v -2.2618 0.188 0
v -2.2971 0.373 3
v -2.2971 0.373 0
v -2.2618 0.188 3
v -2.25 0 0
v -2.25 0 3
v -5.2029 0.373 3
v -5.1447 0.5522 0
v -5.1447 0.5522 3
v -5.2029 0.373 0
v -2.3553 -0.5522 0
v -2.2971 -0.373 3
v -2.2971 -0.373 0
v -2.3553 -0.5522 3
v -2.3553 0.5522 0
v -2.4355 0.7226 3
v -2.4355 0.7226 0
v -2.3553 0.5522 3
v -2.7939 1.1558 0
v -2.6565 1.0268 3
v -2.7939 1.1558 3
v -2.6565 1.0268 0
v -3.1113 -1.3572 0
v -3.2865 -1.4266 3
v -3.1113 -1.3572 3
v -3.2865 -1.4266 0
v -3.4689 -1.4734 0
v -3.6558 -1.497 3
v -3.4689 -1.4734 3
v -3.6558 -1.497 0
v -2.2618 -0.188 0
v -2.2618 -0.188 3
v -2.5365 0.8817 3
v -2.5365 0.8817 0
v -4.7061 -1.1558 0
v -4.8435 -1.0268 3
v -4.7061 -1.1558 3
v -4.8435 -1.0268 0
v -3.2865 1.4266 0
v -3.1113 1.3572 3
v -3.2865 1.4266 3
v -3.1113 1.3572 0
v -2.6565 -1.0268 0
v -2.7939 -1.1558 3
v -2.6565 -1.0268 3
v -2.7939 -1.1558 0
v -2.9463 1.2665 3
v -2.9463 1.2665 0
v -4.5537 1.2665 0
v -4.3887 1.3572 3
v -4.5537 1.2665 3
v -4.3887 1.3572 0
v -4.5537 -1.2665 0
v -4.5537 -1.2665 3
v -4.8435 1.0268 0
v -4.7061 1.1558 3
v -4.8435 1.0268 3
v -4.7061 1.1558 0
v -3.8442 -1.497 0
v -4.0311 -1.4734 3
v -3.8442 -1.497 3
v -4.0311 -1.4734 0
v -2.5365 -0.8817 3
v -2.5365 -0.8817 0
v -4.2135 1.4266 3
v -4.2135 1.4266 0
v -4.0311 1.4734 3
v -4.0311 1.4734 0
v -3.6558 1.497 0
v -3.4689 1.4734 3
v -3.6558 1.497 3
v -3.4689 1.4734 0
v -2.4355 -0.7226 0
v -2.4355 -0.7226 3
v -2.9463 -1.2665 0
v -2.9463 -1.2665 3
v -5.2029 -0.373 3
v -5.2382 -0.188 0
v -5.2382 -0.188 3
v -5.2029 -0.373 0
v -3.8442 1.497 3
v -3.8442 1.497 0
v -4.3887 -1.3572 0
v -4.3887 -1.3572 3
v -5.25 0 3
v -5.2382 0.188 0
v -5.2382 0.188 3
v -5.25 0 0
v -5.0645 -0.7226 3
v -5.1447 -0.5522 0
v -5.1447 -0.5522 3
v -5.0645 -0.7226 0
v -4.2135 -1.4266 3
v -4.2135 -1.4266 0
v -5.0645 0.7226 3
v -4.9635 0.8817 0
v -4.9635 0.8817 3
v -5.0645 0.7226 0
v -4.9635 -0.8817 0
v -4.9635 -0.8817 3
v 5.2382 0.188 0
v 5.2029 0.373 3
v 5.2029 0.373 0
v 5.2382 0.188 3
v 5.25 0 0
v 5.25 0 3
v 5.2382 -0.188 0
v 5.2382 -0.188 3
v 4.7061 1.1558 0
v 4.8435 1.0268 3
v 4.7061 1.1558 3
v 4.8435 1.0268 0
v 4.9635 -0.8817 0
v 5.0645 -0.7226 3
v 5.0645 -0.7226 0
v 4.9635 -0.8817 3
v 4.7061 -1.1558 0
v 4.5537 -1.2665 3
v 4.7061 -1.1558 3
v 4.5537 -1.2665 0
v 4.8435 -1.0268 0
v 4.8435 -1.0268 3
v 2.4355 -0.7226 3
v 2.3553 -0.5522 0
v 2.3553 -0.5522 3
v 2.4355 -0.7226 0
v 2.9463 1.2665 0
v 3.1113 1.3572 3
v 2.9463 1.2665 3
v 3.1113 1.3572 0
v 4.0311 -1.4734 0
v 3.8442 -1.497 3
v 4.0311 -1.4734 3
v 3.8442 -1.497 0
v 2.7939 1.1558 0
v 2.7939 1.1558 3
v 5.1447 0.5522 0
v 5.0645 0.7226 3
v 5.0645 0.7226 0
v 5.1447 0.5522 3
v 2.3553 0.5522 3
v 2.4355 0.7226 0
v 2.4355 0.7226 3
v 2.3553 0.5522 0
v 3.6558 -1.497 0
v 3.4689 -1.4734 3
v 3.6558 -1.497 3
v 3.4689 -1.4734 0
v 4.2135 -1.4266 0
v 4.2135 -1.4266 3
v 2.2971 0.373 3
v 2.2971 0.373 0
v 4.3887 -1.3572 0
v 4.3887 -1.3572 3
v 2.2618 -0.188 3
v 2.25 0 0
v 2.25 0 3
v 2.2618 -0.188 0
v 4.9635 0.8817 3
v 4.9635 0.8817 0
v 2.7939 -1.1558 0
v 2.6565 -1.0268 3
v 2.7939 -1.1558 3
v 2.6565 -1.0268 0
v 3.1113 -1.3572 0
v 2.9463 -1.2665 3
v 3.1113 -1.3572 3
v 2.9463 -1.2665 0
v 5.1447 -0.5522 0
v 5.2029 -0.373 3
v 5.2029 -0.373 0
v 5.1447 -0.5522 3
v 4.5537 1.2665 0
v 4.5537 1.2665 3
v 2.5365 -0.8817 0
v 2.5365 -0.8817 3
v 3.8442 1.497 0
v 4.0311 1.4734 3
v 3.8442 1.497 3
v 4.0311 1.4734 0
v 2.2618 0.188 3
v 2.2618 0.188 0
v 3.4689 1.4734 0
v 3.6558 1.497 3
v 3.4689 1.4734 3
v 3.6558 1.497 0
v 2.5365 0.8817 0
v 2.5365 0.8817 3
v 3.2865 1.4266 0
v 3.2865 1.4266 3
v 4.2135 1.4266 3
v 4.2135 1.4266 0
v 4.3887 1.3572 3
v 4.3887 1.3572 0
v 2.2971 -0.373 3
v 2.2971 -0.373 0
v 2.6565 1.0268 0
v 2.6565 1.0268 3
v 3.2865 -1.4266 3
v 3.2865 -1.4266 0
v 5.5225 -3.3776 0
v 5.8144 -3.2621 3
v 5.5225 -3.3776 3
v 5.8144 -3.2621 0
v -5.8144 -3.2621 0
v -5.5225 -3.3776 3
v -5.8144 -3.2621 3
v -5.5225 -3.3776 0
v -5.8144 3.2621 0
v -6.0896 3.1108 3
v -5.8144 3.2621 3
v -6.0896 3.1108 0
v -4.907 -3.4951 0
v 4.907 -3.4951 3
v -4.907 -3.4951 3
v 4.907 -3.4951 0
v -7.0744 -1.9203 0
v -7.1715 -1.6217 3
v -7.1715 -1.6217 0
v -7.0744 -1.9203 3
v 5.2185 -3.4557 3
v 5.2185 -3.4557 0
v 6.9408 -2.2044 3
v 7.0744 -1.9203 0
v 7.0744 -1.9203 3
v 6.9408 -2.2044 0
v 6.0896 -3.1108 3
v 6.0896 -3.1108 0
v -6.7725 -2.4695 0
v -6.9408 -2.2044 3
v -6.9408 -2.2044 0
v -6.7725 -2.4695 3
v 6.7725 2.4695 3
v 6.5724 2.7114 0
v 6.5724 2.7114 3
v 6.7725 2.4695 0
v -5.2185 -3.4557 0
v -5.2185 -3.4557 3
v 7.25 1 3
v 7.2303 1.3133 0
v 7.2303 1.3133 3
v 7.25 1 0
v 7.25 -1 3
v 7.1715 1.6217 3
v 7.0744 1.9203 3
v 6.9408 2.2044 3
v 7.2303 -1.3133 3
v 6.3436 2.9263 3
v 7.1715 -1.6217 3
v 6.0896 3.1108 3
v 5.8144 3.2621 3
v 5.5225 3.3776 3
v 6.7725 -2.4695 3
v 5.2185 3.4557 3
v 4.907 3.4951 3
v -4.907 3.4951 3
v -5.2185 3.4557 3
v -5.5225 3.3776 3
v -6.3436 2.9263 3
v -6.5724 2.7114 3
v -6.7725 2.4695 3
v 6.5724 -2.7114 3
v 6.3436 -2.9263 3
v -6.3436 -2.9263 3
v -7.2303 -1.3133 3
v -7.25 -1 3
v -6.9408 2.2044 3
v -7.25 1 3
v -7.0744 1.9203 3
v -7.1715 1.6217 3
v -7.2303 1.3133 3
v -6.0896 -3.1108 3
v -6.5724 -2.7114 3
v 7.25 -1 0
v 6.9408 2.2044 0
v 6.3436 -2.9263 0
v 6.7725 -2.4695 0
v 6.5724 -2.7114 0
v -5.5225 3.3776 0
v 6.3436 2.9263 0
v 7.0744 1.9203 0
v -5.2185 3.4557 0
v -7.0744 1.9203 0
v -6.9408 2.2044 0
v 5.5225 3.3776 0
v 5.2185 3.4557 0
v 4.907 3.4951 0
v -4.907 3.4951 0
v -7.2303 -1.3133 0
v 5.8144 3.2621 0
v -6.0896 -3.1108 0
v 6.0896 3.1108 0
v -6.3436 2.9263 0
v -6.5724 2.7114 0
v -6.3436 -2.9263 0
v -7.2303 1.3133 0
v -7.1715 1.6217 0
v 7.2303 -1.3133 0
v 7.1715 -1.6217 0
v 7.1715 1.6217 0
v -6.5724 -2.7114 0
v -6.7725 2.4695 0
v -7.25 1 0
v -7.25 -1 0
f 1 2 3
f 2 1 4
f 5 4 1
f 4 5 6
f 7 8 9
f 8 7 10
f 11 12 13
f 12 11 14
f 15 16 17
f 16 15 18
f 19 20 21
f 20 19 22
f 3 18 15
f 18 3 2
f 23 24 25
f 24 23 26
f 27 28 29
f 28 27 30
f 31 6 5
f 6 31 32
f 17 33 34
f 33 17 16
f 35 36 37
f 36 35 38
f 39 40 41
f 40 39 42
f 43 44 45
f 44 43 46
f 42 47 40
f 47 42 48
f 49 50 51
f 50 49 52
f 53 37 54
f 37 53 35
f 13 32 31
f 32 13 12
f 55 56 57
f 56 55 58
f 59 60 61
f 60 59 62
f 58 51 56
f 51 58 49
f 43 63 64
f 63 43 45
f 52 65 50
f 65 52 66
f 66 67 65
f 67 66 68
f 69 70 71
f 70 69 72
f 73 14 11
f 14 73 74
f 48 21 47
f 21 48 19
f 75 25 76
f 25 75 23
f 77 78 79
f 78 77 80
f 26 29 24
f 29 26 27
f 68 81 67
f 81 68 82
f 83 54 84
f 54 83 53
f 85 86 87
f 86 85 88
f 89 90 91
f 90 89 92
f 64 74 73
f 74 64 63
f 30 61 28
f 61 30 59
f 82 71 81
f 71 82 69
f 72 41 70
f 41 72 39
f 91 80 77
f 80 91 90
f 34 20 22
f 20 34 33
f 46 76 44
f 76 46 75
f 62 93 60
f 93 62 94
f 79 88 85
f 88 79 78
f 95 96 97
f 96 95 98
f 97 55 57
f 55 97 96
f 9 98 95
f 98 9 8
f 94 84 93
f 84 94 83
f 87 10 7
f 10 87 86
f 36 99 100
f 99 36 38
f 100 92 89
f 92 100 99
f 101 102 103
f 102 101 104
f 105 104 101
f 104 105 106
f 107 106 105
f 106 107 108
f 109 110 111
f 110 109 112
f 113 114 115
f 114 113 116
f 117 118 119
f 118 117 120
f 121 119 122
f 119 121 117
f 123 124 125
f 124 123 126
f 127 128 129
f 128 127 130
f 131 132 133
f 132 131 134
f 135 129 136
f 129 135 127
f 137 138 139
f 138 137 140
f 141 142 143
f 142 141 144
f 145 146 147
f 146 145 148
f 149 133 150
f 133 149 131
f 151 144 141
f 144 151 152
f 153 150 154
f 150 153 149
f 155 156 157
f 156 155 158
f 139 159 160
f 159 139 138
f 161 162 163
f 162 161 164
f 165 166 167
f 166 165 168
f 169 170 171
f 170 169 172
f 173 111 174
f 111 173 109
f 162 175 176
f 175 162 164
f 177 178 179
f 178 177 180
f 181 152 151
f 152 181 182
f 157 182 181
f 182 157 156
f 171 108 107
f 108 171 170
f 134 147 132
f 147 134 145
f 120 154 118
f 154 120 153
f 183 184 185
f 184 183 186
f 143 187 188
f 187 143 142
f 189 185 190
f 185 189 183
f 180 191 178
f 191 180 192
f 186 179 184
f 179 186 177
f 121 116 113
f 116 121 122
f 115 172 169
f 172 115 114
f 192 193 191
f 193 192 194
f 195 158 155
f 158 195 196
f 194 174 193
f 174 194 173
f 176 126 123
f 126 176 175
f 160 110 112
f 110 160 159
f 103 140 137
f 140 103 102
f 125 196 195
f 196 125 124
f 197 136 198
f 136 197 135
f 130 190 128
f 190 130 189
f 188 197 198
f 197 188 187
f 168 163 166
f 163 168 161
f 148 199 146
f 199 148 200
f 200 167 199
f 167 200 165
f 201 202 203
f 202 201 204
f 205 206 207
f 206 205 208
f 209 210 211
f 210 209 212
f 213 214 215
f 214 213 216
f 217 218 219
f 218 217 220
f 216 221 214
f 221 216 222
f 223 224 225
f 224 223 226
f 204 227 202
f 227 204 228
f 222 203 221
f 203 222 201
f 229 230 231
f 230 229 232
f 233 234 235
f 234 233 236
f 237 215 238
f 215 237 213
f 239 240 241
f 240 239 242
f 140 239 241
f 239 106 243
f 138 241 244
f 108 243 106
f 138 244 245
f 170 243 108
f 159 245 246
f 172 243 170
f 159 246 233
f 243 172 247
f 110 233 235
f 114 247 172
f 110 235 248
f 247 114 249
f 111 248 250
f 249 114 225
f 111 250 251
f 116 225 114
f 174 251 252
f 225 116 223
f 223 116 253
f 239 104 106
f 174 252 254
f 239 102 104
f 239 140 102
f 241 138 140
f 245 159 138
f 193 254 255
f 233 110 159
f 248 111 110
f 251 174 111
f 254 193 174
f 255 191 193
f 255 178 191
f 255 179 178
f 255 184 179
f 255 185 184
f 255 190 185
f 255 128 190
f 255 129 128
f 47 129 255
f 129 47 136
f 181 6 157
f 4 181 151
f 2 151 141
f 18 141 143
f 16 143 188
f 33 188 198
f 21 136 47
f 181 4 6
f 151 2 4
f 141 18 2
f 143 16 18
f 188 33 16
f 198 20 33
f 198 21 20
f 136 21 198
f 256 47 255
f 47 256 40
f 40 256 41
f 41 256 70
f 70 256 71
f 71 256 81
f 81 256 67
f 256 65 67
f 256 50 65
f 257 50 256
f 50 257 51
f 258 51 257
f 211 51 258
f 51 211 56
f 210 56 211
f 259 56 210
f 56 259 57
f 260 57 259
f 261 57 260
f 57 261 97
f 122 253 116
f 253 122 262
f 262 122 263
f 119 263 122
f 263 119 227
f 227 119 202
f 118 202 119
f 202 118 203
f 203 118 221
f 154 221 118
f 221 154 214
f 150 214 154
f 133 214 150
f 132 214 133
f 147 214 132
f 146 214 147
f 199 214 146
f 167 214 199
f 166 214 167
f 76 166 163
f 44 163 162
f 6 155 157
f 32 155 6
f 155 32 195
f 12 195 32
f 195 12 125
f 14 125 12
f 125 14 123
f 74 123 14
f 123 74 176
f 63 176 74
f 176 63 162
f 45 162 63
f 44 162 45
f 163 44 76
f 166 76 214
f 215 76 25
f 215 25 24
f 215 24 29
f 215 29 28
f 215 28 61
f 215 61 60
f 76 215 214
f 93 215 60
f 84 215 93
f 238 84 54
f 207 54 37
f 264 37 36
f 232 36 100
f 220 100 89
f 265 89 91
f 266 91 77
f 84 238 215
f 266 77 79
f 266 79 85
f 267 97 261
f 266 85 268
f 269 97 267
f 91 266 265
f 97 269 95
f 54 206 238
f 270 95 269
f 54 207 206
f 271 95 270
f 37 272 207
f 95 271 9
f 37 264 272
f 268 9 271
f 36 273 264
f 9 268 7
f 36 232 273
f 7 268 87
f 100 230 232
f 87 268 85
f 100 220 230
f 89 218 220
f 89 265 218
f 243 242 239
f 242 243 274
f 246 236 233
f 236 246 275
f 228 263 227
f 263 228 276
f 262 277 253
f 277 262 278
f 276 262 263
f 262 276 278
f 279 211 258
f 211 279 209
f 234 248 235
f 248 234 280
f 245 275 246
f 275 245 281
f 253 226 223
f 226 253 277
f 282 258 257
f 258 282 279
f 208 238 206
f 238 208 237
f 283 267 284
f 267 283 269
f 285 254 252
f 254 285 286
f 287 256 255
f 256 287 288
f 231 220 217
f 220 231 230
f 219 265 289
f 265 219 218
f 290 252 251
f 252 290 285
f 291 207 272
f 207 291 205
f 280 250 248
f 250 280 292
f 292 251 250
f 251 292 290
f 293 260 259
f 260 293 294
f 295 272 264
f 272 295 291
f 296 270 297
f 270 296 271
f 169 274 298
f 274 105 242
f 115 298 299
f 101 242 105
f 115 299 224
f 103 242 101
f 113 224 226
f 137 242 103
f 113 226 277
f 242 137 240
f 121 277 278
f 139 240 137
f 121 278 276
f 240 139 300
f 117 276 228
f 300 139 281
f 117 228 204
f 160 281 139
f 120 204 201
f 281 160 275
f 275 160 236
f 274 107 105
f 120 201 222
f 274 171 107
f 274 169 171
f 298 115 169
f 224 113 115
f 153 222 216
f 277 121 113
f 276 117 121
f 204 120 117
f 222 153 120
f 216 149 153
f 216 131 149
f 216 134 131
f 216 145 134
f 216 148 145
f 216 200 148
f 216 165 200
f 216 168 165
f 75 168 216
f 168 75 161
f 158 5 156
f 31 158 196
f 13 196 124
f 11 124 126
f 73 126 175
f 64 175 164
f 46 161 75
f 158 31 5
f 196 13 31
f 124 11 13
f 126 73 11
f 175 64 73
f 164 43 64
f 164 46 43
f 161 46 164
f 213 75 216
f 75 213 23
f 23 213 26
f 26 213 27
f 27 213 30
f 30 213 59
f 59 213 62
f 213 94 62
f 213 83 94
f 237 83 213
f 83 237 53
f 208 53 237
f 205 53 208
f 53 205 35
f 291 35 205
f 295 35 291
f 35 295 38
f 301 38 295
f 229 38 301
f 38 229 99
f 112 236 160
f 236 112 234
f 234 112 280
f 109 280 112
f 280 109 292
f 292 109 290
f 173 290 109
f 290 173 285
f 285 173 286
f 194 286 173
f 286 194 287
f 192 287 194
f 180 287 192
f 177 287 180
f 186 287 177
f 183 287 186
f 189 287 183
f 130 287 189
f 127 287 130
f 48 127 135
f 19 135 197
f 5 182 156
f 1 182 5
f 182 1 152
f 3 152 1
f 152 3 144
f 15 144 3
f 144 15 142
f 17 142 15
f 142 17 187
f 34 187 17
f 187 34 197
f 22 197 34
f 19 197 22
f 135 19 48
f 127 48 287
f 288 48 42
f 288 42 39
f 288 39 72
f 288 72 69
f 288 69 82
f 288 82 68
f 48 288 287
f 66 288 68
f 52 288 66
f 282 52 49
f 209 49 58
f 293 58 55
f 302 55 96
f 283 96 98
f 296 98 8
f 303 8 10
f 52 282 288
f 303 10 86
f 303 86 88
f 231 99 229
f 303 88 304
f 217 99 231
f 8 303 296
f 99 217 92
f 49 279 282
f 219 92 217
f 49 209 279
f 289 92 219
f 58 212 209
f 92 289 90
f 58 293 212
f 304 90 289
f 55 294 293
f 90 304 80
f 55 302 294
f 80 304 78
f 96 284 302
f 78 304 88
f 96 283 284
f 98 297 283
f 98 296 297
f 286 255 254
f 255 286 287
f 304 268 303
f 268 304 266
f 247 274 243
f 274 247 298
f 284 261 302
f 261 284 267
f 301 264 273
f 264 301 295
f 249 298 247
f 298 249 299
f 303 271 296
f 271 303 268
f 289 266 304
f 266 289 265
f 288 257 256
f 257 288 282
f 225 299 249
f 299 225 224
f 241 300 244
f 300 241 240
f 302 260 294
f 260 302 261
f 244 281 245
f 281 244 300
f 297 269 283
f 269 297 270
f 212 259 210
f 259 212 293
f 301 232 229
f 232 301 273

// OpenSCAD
$fn = 50;


difference() {
	union() {
		translate(v = [0, 0, 0]) {
			rotate(a = [0, 0, 0]) {
				hull() {
					translate(v = [-4.7500000000, 1.0000000000, 0]) {
						rotate(a = [0, 0, 0]) {
							translate(v = [0, 0, 0]) {
								rotate(a = [0, 0, 0]) {
									cylinder(h = 3, r = 2.5000000000);
								}
							}
						}
					}
					translate(v = [4.7500000000, 1.0000000000, 0]) {
						rotate(a = [0, 0, 0]) {
							translate(v = [0, 0, 0]) {
								rotate(a = [0, 0, 0]) {
									cylinder(h = 3, r = 2.5000000000);
								}
							}
						}
					}
					translate(v = [-4.7500000000, -1.0000000000, 0]) {
						rotate(a = [0, 0, 0]) {
							translate(v = [0, 0, 0]) {
								rotate(a = [0, 0, 0]) {
									cylinder(h = 3, r = 2.5000000000);
								}
							}
						}
					}
					translate(v = [4.7500000000, -1.0000000000, 0]) {
						rotate(a = [0, 0, 0]) {
							translate(v = [0, 0, 0]) {
								rotate(a = [0, 0, 0]) {
									cylinder(h = 3, r = 2.5000000000);
								}
							}
						}
					}
				}
			}
		}
	}
	union() {
		translate(v = [-3.7500000000, 0.0000000000, 0]) {
			rotate(a = [0, 0, 0]) {
				translate(v = [0, 0, -50]) {
					rotate(a = [0, 0, 0]) {
						cylinder(h = 100, r = 1.5000000000);
					}
				}
			}
		}
		translate(v = [3.7500000000, 0.0000000000, 0]) {
			rotate(a = [0, 0, 0]) {
				translate(v = [0, 0, -50]) {
					rotate(a = [0, 0, 0]) {
						cylinder(h = 100, r = 1.5000000000);
					}
				}
			}
		}
	}
}
